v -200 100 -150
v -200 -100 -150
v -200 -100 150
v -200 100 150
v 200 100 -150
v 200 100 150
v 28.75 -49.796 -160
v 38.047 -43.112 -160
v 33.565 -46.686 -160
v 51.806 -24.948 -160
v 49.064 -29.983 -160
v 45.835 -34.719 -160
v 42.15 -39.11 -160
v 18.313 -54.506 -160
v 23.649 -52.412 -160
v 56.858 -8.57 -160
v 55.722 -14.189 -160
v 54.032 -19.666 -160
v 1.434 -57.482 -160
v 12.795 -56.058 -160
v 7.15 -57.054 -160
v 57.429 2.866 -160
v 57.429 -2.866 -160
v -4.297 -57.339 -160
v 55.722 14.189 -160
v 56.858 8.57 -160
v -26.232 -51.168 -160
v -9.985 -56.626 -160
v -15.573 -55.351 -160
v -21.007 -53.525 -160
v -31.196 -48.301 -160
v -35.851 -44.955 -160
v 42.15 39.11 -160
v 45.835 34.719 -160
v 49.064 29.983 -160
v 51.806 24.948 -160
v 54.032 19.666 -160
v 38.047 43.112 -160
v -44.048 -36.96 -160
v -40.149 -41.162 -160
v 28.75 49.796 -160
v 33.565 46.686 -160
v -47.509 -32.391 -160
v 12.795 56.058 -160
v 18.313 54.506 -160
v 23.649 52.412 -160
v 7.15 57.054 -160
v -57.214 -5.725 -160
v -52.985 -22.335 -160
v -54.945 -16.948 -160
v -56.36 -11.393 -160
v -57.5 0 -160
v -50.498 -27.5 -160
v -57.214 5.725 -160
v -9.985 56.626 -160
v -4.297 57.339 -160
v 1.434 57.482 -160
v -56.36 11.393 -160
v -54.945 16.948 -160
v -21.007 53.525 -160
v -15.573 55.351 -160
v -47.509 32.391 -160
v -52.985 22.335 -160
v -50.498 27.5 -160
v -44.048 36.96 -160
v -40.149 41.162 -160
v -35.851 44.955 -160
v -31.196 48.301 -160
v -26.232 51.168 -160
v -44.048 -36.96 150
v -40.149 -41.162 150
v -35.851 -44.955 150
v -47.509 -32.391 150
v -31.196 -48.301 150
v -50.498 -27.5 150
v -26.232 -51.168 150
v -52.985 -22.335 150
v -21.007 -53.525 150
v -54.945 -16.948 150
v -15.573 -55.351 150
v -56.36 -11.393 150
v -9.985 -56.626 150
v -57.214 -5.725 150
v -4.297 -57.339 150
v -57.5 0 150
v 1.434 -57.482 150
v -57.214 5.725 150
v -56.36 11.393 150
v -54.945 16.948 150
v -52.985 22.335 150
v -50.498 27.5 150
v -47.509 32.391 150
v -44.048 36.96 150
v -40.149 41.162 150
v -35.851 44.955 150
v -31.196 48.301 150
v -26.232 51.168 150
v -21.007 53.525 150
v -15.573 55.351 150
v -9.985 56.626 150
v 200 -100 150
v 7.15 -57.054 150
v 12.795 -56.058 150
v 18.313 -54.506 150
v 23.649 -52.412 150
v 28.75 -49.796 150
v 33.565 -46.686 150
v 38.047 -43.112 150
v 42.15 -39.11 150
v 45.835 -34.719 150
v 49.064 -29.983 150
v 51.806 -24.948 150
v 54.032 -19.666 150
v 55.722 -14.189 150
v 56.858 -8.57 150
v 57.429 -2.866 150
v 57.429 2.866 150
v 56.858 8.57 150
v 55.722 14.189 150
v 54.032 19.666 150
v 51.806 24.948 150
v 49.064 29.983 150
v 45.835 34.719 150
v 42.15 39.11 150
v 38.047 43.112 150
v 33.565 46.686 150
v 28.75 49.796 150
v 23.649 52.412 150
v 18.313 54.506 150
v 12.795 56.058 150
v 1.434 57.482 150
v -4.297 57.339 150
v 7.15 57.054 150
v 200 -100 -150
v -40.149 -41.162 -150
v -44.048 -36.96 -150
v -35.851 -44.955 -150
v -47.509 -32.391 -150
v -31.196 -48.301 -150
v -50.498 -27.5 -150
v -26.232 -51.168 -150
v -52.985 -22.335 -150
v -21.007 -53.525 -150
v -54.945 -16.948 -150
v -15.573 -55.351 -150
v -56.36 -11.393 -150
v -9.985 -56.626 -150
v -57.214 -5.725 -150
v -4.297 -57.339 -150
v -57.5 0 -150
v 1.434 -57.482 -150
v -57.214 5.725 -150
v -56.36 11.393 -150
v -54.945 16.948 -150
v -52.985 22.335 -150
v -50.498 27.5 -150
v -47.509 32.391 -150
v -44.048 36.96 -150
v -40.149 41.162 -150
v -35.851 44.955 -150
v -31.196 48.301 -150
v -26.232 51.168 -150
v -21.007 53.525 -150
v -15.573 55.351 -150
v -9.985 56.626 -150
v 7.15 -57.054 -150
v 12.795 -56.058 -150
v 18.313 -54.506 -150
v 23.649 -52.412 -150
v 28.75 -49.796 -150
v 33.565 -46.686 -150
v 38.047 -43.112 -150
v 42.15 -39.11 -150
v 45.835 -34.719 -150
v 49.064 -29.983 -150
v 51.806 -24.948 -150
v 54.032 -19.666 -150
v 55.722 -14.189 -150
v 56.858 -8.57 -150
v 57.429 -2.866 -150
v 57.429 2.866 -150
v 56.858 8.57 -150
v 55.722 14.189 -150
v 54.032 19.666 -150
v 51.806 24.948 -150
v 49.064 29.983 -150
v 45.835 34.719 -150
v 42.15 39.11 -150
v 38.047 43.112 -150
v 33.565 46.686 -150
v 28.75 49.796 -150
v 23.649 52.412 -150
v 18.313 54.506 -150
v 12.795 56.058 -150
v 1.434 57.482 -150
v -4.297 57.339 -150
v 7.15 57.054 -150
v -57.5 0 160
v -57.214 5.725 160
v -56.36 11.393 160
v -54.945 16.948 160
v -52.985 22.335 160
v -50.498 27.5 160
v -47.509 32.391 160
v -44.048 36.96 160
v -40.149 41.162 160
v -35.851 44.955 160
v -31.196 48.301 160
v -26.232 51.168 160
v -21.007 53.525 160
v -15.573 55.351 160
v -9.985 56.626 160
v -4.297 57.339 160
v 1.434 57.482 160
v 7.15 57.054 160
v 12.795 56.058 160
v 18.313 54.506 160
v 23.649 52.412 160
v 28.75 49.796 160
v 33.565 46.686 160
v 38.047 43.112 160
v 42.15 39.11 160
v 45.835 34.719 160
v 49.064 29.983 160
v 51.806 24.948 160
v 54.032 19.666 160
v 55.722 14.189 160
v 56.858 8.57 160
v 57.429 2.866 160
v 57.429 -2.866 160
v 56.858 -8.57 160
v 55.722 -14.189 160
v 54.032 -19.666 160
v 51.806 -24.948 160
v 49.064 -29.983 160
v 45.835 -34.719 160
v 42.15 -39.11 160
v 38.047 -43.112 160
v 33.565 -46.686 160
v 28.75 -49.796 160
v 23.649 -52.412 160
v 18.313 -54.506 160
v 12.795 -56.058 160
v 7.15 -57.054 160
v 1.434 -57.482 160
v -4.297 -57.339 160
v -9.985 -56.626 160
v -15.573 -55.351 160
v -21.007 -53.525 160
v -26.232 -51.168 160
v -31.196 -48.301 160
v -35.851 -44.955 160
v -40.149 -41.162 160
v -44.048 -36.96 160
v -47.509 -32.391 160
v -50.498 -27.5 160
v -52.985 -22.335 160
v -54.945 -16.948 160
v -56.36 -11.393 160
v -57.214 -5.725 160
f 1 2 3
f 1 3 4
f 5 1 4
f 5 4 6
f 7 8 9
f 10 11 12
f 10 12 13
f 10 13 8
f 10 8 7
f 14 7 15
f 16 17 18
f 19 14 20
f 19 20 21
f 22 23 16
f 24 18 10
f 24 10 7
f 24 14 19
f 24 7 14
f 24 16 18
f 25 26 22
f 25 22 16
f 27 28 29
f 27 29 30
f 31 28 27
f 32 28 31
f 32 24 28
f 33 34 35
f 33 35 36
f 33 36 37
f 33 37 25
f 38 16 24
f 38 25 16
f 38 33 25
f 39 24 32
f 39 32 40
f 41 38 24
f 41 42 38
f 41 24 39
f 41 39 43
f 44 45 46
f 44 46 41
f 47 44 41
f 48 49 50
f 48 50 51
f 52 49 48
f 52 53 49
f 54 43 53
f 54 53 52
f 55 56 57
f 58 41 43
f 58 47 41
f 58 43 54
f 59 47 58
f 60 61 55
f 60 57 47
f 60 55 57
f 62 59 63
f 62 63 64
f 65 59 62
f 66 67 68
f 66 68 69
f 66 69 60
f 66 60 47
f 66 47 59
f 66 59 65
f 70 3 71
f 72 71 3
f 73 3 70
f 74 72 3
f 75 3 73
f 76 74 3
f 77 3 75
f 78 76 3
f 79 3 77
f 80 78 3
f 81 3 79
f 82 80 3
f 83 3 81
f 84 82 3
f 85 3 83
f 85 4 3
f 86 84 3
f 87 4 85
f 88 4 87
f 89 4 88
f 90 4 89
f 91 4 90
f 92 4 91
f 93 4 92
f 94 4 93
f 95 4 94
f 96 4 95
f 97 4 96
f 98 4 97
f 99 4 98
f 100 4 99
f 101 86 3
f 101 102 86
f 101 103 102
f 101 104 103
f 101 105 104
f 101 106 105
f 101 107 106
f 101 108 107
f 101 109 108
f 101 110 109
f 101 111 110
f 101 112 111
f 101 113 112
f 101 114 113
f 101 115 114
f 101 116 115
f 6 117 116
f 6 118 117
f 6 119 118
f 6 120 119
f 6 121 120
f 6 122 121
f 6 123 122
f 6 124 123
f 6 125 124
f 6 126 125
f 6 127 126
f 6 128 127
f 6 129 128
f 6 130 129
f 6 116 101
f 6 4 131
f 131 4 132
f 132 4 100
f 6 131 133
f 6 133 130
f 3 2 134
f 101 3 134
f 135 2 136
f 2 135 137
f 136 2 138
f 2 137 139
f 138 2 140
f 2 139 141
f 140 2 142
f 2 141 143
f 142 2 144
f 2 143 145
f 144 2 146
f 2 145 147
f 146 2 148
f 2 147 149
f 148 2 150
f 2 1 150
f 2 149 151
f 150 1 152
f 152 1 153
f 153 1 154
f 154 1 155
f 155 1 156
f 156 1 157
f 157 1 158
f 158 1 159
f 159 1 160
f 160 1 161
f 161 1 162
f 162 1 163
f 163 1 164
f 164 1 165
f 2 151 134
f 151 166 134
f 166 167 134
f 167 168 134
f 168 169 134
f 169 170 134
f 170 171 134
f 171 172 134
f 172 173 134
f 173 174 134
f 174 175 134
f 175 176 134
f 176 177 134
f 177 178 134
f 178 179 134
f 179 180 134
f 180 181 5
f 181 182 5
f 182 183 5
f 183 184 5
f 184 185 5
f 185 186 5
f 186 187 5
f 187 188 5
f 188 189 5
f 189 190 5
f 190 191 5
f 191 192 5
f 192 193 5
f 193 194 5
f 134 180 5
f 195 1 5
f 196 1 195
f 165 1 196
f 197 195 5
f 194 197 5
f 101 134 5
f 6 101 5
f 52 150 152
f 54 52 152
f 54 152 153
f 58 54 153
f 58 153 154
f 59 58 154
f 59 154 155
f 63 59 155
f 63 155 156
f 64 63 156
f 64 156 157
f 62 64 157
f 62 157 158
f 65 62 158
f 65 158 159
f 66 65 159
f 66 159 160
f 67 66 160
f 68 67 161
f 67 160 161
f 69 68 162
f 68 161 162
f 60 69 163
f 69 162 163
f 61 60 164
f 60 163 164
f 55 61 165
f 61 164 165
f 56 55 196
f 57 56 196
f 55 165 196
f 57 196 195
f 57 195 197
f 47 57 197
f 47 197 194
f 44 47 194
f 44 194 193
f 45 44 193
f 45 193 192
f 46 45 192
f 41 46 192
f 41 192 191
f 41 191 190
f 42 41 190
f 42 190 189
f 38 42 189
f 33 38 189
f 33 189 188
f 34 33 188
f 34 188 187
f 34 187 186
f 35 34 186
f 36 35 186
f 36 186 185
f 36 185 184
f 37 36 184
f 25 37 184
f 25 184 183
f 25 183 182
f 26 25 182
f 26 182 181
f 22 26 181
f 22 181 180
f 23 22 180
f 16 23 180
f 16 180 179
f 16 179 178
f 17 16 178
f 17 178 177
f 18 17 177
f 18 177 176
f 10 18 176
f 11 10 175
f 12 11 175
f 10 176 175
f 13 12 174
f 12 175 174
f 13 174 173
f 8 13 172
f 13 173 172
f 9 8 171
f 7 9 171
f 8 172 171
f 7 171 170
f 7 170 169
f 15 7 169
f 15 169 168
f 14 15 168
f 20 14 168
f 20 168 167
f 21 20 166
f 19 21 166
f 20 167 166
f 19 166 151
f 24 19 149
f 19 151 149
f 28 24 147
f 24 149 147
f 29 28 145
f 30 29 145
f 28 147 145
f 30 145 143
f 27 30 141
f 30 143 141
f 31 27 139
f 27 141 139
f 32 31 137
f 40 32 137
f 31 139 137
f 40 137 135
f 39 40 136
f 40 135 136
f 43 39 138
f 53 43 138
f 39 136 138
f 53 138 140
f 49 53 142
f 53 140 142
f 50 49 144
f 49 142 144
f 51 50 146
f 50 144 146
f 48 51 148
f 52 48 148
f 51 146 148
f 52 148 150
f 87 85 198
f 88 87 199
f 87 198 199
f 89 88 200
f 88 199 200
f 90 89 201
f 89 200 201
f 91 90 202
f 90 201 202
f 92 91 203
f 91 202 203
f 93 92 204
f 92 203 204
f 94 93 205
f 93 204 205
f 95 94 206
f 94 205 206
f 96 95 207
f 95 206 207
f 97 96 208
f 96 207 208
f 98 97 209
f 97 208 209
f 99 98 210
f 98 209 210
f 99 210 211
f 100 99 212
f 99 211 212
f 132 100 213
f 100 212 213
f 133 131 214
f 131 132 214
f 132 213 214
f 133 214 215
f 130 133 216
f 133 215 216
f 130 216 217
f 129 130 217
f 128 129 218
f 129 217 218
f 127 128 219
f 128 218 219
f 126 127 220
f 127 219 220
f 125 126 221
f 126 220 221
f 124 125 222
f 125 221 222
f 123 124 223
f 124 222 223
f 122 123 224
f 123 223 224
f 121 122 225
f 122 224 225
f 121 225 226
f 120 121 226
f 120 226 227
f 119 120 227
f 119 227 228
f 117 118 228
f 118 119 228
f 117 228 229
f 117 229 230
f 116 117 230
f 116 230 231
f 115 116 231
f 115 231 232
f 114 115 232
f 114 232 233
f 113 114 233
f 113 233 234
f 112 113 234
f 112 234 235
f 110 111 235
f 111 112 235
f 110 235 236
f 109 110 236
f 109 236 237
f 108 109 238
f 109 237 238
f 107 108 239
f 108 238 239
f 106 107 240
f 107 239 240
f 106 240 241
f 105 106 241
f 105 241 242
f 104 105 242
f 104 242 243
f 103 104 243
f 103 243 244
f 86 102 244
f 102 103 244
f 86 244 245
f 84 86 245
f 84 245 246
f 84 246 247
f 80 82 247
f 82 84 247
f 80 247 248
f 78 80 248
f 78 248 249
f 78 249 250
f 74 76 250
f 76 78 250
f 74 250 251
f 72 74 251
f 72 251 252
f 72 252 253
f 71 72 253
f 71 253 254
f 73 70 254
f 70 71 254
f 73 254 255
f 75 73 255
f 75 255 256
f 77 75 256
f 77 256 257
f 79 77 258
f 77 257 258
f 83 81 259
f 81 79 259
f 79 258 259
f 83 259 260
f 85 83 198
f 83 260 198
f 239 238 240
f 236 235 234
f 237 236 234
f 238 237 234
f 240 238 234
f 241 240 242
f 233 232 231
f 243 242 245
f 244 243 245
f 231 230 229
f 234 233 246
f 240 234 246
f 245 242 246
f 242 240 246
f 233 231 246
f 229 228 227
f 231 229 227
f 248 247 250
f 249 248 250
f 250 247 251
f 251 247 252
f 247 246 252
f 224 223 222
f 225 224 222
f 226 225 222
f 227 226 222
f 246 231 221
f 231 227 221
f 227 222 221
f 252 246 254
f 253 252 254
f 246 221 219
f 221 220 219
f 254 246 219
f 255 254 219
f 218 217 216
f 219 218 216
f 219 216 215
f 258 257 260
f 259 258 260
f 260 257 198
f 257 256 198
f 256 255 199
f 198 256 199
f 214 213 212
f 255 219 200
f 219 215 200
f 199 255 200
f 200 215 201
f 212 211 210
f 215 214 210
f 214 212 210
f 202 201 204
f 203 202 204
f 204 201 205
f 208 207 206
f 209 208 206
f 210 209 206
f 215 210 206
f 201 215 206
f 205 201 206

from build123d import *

# Parameters (mm, degrees)
BOSS_EXTRUDE1_DEPTH      = 150
BOSS_EXTRUDE1_DEPTH_BACK = 150
SKETCH1_W                = 400
SKETCH1_H                = 200
BOSS_EXTRUDE2_DEPTH      = 160
BOSS_EXTRUDE2_DEPTH_BACK = 160
SKETCH2_R                = 57.5


with BuildPart() as part:
    # Sketch1 → Boss-Extrude1 (new, two sides: drawn at the far end of the back side and taken through both)
    with BuildSketch(Plane.XY.offset(-BOSS_EXTRUDE1_DEPTH_BACK)):
        Rectangle(SKETCH1_W, SKETCH1_H)
    extrude(amount=BOSS_EXTRUDE1_DEPTH + BOSS_EXTRUDE1_DEPTH_BACK)

    # Sketch2 → Boss-Extrude2 (add, two sides: drawn at the far end of the back side and taken through both)
    with BuildSketch(Plane(origin=(0, 0, 0), x_dir=(-1, 0, 0), z_dir=(0, 0, -1)).offset(-BOSS_EXTRUDE2_DEPTH_BACK)):
        Circle(SKETCH2_R)
    extrude(amount=BOSS_EXTRUDE2_DEPTH + BOSS_EXTRUDE2_DEPTH_BACK)


solid = part.part
